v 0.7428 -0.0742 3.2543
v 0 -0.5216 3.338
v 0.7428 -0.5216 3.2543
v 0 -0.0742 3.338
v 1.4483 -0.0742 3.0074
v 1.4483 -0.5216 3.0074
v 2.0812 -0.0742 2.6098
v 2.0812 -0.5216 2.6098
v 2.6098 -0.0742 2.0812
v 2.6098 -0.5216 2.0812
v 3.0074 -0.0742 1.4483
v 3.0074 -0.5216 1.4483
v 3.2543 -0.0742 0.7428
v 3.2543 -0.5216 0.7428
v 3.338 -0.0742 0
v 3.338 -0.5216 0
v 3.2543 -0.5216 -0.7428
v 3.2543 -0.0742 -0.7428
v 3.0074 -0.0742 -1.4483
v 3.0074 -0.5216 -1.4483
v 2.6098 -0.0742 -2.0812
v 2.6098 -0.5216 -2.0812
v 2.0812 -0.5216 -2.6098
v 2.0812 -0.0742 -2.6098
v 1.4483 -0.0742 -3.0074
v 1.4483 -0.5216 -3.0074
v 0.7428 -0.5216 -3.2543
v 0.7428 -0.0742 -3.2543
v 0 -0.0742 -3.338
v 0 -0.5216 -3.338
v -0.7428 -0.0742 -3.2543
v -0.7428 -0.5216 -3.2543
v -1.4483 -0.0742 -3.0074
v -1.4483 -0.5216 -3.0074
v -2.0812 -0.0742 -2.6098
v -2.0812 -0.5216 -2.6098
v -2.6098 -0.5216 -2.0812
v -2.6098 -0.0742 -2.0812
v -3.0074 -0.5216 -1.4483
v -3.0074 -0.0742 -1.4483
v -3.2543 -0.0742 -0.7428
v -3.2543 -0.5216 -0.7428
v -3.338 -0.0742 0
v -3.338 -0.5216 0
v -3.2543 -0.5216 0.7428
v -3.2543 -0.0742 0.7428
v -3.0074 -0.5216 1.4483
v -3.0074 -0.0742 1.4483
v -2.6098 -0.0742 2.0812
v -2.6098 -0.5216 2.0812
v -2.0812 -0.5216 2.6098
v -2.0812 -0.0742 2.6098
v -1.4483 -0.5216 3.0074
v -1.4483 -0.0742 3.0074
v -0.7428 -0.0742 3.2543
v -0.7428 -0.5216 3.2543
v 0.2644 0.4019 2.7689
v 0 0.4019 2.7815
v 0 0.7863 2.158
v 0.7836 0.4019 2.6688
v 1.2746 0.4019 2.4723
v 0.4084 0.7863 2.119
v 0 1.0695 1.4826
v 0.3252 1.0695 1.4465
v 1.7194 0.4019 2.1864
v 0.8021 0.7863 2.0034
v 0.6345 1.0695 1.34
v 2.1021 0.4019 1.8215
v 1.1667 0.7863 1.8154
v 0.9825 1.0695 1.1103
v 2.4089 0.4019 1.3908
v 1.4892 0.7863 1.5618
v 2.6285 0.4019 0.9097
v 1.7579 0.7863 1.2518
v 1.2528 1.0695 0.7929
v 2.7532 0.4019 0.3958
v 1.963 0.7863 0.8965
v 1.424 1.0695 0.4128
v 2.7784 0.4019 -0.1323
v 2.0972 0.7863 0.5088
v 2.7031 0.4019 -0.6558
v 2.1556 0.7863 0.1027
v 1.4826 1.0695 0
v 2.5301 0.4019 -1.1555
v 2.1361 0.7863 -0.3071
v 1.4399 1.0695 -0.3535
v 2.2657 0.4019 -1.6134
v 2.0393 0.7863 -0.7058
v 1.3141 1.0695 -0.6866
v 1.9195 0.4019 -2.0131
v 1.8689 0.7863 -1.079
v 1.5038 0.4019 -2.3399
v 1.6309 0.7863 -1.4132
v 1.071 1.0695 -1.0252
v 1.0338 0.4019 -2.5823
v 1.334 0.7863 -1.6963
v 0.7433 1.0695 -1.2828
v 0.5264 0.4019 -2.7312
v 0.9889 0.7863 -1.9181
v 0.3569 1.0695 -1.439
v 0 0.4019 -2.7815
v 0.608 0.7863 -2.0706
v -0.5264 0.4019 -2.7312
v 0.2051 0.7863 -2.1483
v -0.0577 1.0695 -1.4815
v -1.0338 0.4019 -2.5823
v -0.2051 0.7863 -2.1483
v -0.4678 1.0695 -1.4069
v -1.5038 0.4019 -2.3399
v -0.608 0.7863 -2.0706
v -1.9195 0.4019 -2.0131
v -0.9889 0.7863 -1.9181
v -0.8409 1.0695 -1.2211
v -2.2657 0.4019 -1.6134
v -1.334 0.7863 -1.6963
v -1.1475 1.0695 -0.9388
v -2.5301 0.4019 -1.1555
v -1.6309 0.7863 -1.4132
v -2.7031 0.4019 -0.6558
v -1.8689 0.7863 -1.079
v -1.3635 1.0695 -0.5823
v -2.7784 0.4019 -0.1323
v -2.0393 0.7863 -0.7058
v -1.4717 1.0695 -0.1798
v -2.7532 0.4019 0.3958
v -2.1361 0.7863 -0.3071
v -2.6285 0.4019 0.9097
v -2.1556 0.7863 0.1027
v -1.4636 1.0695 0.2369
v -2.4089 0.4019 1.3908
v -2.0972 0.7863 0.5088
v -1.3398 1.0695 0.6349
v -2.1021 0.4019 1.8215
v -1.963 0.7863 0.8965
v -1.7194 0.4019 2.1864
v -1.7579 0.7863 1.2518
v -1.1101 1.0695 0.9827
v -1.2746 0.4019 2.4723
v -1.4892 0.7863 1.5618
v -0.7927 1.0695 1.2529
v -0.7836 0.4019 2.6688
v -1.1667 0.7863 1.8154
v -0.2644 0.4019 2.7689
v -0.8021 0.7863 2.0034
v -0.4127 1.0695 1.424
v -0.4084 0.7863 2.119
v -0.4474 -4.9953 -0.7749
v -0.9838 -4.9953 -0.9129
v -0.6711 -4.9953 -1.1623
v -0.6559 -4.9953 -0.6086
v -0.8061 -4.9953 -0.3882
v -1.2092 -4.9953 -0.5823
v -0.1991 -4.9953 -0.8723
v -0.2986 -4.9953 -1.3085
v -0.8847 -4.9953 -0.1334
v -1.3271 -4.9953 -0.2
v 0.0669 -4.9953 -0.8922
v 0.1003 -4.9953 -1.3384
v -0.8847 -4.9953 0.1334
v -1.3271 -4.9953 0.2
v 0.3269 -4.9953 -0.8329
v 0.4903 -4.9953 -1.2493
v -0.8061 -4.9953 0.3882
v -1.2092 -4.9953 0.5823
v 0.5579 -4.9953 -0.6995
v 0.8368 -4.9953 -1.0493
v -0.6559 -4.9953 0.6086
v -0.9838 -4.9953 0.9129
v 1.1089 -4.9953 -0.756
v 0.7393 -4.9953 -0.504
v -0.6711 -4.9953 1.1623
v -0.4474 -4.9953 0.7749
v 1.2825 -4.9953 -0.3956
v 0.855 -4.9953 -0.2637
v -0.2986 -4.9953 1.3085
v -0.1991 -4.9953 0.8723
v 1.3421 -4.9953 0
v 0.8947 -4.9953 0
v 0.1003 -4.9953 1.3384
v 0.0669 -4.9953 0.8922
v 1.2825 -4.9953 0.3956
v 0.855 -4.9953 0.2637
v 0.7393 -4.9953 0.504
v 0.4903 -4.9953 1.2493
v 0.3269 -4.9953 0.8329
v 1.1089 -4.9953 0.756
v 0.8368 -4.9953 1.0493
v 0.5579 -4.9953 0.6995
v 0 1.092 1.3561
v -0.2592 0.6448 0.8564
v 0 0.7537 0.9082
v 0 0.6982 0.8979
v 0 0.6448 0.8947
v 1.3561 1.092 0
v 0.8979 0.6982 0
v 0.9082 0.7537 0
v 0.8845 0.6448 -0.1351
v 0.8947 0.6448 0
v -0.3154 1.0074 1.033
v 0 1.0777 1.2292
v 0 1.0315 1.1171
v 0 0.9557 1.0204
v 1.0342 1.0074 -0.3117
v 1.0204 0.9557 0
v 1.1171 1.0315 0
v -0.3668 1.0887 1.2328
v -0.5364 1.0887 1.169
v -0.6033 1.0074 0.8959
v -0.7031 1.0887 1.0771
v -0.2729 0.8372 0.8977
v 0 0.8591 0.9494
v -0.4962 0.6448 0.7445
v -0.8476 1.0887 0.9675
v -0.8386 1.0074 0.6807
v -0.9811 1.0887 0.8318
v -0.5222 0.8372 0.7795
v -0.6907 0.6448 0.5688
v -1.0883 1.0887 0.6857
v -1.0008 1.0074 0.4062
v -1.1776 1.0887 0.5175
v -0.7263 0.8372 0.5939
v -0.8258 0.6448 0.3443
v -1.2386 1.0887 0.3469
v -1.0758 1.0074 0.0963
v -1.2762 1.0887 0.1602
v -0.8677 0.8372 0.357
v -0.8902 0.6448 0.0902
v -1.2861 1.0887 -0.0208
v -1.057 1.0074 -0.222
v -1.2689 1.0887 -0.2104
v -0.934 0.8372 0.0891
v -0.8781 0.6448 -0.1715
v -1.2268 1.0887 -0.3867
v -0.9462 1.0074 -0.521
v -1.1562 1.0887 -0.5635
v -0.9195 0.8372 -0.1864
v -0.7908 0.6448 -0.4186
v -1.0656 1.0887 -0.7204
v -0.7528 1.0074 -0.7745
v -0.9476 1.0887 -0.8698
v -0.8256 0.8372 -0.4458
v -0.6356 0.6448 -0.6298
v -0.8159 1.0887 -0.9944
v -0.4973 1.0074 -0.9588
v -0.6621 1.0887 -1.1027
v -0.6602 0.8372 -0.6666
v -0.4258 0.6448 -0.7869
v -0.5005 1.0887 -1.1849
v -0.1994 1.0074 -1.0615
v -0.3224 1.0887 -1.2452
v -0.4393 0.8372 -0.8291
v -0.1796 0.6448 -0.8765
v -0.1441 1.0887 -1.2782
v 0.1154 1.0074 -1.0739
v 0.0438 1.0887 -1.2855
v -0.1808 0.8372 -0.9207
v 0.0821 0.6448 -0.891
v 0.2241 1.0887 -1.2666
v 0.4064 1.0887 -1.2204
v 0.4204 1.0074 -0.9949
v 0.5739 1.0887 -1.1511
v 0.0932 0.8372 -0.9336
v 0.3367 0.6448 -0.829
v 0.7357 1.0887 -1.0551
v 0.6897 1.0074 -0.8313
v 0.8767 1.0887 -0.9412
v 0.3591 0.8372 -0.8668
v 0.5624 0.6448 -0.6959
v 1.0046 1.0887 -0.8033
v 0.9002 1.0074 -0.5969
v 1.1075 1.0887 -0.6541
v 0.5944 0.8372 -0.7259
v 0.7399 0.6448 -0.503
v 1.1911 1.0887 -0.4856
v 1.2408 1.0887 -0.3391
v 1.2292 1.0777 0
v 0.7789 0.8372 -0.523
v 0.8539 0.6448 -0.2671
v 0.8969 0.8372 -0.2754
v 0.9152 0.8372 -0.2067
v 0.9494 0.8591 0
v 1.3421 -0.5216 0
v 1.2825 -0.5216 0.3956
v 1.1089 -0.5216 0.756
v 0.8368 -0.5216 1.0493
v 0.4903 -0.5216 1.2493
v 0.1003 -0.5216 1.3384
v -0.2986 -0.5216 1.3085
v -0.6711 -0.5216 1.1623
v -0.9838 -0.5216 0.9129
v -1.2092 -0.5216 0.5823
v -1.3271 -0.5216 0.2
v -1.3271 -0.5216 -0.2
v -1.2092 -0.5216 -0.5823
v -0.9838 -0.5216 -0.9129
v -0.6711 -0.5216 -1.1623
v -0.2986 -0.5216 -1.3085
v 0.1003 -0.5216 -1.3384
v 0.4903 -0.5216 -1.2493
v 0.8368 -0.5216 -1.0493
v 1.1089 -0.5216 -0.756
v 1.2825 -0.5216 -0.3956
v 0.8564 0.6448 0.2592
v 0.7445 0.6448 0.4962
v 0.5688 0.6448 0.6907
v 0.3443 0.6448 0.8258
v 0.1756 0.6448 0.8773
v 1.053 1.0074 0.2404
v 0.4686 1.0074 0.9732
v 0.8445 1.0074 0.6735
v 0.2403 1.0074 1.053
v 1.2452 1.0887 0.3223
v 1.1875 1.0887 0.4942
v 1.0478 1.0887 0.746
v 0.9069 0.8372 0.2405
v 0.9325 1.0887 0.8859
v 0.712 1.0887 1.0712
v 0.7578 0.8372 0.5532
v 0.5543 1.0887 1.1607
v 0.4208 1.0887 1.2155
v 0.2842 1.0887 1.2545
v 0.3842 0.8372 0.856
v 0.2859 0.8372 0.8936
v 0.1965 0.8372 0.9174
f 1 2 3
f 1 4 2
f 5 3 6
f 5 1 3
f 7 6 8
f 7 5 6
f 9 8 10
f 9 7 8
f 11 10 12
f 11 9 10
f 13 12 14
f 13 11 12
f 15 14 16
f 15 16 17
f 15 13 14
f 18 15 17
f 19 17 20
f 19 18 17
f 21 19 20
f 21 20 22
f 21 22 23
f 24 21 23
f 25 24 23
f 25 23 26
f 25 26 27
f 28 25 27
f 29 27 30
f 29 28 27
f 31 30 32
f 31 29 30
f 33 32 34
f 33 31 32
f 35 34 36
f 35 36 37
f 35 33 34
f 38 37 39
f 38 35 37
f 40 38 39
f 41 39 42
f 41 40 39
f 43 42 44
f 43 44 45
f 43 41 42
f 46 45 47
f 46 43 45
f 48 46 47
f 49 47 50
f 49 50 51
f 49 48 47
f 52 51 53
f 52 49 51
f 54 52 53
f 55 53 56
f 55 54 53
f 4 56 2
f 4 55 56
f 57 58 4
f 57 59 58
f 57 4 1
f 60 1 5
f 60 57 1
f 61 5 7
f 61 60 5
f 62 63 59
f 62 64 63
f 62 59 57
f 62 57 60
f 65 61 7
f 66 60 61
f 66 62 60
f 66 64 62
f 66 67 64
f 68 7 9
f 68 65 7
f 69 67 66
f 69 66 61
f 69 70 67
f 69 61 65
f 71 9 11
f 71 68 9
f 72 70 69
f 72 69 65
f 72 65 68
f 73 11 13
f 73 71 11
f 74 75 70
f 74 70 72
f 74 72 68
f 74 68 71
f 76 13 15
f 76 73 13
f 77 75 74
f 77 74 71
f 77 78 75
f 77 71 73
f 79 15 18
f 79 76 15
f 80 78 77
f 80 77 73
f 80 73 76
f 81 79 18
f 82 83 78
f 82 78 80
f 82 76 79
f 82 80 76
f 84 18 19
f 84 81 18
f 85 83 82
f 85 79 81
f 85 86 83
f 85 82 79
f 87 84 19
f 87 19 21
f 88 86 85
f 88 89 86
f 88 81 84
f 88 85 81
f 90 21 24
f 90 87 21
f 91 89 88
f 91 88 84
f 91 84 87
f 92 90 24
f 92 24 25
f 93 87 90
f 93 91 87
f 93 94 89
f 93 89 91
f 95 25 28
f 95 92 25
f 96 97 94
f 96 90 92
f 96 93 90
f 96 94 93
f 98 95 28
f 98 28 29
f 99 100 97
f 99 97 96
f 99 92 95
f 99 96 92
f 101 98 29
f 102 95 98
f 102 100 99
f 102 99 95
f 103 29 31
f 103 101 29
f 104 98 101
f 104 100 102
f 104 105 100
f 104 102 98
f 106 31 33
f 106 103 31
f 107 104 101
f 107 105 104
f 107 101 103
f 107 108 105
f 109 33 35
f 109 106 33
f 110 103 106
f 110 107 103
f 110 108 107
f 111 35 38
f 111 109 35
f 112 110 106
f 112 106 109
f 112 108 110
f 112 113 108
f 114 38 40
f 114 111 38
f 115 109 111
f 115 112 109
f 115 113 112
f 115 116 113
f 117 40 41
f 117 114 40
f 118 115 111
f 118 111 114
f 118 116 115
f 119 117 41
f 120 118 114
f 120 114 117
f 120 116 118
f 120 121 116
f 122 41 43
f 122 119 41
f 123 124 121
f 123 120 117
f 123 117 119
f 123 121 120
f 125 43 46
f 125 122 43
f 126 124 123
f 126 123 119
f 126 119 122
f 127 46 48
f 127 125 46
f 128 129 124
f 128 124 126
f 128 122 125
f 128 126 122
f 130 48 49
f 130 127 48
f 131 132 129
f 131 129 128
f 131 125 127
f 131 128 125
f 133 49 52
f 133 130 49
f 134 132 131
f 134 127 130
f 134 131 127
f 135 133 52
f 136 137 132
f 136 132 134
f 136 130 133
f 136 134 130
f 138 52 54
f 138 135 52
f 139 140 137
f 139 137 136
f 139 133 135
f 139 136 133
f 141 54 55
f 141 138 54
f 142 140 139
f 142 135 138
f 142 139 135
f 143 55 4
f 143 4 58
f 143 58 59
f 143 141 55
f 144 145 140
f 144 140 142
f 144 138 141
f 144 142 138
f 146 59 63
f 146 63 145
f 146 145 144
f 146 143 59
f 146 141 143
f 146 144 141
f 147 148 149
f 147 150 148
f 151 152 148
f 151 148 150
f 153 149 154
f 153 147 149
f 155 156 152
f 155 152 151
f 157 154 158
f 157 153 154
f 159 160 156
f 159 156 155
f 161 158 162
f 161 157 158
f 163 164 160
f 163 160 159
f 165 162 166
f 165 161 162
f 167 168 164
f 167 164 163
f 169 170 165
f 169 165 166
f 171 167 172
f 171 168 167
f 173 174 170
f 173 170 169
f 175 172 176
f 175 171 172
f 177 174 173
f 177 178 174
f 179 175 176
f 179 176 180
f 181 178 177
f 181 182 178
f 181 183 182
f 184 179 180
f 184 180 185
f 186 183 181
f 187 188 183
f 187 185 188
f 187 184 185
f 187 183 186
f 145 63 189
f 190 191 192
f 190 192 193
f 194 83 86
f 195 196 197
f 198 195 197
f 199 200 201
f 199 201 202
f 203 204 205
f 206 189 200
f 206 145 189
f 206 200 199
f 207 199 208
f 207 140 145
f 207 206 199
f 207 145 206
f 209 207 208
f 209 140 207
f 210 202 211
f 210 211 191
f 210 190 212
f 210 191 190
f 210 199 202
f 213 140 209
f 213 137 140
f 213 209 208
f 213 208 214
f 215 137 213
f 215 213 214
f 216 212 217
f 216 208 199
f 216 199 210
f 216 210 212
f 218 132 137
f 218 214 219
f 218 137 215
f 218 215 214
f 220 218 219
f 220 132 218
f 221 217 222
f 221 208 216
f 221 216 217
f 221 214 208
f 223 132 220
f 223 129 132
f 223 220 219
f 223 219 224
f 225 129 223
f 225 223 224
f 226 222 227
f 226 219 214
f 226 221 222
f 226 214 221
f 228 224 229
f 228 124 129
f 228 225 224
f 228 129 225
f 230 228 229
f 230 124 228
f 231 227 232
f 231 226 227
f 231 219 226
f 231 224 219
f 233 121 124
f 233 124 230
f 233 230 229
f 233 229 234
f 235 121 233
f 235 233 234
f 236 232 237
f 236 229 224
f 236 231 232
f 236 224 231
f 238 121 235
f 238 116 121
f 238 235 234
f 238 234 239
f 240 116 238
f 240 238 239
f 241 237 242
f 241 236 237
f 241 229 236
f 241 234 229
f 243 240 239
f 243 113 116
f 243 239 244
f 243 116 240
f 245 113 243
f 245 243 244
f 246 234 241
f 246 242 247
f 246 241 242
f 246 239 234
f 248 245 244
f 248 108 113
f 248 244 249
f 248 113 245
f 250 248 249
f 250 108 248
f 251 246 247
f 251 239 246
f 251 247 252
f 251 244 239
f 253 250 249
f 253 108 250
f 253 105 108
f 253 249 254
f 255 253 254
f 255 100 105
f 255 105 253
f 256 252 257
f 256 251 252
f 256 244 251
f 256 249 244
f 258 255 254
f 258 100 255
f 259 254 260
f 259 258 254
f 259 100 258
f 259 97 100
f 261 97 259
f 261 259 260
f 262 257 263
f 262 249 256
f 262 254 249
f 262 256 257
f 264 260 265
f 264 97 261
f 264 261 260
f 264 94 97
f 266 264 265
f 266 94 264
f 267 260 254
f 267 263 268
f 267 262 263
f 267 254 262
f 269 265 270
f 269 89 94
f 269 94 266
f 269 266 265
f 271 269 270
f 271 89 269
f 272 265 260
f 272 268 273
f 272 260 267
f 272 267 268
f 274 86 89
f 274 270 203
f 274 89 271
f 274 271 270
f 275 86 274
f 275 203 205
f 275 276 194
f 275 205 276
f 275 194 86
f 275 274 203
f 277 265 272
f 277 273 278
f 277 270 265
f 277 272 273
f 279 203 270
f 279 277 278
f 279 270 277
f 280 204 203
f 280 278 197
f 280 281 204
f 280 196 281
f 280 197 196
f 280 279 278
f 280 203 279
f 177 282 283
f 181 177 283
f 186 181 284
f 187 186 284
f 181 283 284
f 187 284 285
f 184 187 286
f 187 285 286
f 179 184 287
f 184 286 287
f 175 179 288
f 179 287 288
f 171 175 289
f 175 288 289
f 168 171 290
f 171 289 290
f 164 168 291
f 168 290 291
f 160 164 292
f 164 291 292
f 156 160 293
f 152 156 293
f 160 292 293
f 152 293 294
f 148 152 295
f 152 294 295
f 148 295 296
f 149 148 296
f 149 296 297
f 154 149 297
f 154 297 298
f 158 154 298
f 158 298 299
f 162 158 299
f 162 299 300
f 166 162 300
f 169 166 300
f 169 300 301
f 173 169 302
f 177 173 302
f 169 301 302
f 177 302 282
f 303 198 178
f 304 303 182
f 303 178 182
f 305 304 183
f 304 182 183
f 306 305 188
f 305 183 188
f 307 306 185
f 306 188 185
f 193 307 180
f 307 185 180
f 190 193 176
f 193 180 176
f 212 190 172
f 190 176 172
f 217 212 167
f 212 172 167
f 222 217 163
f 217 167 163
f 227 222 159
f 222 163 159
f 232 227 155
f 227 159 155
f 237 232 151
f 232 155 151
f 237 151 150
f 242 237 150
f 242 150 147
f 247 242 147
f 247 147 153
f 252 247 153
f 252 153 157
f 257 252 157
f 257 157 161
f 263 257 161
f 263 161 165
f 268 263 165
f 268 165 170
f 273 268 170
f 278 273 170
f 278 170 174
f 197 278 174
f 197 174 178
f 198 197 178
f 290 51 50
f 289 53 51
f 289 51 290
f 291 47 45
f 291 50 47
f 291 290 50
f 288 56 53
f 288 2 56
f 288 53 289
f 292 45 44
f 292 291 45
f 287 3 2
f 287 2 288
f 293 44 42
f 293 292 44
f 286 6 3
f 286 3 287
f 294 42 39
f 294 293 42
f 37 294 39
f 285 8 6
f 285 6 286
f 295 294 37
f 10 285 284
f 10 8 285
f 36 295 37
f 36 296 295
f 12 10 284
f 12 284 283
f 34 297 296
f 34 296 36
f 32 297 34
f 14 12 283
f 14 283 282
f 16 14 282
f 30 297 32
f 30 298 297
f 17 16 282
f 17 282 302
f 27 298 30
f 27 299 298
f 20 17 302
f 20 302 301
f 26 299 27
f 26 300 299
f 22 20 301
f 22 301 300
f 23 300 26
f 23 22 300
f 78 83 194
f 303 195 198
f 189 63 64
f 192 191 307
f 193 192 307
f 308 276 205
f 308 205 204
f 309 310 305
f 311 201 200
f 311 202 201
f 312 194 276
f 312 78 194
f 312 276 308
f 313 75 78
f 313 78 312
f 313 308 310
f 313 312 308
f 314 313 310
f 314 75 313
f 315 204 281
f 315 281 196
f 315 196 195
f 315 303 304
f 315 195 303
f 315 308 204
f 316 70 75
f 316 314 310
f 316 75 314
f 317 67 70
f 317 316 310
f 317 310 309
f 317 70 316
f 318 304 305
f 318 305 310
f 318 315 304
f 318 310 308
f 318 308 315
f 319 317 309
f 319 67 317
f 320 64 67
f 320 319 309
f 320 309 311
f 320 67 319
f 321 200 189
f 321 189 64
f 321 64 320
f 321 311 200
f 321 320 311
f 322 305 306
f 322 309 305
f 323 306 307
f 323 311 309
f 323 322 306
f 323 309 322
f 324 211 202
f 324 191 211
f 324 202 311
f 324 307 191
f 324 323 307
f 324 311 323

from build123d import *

# Parameters (mm, degrees)
SKETCH3_R           = 1.5
BOSS_EXTRUDE1_DEPTH = 5
SKETCH4_R           = 1
CUT_EXTRUDE1_DEPTH  = 8.04531685
FILLET1_R           = 0.5
SCALE_1_SCALE       = 0.894736842


with BuildPart() as part:
    # Sketch2 → Revolve2 (revolve)
    with BuildSketch(Plane(origin=(0, 0, 0), x_dir=(0, 0, -1), z_dir=(1, 0, 0))):
        with BuildLine():
            Line((0, 1.54531685), (0, 0))
            Line((0, 0), (0, -0.5))
            Line((0, -0.5), (-3.730724896, -0.5))
            Line((-3.730724896, -0.5), (-3.730724896, 0))
            ThreePointArc((-3.730724896, 0), (-2.019053765, 1.143702085), (0, 1.54531685))
        make_face()
    revolve(axis=Axis((0, -0.5, 0), (0, 1, 0)))

    # Sketch3 → Boss-Extrude1 (add)
    with BuildSketch(Plane.XZ.offset(0.5)):
        Circle(SKETCH3_R)
    extrude(amount=BOSS_EXTRUDE1_DEPTH)

    # Sketch4 → Cut-Extrude1 (cut, through all)
    with BuildSketch(Plane.XZ.offset(5.5)):
        Circle(SKETCH4_R)
    extrude(amount=-CUT_EXTRUDE1_DEPTH, mode=Mode.SUBTRACT)

    # Fillet1
    fillet1_edges = [part.edges().sort_by_distance(p)[0] for p in [
        (-0.707106781, 1.449682086, -0.707106781),
    ]]
    fillet(fillet1_edges, radius=FILLET1_R)


with BuildPart() as part_1:
    # ｽｹｰﾙ1: scaled about (5.91e-07, -0.705292116, -1.889e-06)
    add(part.part.scale(SCALE_1_SCALE).moved(Location((6.2e-08, -0.074241275, -1.99e-07))))


solid = part_1.part
